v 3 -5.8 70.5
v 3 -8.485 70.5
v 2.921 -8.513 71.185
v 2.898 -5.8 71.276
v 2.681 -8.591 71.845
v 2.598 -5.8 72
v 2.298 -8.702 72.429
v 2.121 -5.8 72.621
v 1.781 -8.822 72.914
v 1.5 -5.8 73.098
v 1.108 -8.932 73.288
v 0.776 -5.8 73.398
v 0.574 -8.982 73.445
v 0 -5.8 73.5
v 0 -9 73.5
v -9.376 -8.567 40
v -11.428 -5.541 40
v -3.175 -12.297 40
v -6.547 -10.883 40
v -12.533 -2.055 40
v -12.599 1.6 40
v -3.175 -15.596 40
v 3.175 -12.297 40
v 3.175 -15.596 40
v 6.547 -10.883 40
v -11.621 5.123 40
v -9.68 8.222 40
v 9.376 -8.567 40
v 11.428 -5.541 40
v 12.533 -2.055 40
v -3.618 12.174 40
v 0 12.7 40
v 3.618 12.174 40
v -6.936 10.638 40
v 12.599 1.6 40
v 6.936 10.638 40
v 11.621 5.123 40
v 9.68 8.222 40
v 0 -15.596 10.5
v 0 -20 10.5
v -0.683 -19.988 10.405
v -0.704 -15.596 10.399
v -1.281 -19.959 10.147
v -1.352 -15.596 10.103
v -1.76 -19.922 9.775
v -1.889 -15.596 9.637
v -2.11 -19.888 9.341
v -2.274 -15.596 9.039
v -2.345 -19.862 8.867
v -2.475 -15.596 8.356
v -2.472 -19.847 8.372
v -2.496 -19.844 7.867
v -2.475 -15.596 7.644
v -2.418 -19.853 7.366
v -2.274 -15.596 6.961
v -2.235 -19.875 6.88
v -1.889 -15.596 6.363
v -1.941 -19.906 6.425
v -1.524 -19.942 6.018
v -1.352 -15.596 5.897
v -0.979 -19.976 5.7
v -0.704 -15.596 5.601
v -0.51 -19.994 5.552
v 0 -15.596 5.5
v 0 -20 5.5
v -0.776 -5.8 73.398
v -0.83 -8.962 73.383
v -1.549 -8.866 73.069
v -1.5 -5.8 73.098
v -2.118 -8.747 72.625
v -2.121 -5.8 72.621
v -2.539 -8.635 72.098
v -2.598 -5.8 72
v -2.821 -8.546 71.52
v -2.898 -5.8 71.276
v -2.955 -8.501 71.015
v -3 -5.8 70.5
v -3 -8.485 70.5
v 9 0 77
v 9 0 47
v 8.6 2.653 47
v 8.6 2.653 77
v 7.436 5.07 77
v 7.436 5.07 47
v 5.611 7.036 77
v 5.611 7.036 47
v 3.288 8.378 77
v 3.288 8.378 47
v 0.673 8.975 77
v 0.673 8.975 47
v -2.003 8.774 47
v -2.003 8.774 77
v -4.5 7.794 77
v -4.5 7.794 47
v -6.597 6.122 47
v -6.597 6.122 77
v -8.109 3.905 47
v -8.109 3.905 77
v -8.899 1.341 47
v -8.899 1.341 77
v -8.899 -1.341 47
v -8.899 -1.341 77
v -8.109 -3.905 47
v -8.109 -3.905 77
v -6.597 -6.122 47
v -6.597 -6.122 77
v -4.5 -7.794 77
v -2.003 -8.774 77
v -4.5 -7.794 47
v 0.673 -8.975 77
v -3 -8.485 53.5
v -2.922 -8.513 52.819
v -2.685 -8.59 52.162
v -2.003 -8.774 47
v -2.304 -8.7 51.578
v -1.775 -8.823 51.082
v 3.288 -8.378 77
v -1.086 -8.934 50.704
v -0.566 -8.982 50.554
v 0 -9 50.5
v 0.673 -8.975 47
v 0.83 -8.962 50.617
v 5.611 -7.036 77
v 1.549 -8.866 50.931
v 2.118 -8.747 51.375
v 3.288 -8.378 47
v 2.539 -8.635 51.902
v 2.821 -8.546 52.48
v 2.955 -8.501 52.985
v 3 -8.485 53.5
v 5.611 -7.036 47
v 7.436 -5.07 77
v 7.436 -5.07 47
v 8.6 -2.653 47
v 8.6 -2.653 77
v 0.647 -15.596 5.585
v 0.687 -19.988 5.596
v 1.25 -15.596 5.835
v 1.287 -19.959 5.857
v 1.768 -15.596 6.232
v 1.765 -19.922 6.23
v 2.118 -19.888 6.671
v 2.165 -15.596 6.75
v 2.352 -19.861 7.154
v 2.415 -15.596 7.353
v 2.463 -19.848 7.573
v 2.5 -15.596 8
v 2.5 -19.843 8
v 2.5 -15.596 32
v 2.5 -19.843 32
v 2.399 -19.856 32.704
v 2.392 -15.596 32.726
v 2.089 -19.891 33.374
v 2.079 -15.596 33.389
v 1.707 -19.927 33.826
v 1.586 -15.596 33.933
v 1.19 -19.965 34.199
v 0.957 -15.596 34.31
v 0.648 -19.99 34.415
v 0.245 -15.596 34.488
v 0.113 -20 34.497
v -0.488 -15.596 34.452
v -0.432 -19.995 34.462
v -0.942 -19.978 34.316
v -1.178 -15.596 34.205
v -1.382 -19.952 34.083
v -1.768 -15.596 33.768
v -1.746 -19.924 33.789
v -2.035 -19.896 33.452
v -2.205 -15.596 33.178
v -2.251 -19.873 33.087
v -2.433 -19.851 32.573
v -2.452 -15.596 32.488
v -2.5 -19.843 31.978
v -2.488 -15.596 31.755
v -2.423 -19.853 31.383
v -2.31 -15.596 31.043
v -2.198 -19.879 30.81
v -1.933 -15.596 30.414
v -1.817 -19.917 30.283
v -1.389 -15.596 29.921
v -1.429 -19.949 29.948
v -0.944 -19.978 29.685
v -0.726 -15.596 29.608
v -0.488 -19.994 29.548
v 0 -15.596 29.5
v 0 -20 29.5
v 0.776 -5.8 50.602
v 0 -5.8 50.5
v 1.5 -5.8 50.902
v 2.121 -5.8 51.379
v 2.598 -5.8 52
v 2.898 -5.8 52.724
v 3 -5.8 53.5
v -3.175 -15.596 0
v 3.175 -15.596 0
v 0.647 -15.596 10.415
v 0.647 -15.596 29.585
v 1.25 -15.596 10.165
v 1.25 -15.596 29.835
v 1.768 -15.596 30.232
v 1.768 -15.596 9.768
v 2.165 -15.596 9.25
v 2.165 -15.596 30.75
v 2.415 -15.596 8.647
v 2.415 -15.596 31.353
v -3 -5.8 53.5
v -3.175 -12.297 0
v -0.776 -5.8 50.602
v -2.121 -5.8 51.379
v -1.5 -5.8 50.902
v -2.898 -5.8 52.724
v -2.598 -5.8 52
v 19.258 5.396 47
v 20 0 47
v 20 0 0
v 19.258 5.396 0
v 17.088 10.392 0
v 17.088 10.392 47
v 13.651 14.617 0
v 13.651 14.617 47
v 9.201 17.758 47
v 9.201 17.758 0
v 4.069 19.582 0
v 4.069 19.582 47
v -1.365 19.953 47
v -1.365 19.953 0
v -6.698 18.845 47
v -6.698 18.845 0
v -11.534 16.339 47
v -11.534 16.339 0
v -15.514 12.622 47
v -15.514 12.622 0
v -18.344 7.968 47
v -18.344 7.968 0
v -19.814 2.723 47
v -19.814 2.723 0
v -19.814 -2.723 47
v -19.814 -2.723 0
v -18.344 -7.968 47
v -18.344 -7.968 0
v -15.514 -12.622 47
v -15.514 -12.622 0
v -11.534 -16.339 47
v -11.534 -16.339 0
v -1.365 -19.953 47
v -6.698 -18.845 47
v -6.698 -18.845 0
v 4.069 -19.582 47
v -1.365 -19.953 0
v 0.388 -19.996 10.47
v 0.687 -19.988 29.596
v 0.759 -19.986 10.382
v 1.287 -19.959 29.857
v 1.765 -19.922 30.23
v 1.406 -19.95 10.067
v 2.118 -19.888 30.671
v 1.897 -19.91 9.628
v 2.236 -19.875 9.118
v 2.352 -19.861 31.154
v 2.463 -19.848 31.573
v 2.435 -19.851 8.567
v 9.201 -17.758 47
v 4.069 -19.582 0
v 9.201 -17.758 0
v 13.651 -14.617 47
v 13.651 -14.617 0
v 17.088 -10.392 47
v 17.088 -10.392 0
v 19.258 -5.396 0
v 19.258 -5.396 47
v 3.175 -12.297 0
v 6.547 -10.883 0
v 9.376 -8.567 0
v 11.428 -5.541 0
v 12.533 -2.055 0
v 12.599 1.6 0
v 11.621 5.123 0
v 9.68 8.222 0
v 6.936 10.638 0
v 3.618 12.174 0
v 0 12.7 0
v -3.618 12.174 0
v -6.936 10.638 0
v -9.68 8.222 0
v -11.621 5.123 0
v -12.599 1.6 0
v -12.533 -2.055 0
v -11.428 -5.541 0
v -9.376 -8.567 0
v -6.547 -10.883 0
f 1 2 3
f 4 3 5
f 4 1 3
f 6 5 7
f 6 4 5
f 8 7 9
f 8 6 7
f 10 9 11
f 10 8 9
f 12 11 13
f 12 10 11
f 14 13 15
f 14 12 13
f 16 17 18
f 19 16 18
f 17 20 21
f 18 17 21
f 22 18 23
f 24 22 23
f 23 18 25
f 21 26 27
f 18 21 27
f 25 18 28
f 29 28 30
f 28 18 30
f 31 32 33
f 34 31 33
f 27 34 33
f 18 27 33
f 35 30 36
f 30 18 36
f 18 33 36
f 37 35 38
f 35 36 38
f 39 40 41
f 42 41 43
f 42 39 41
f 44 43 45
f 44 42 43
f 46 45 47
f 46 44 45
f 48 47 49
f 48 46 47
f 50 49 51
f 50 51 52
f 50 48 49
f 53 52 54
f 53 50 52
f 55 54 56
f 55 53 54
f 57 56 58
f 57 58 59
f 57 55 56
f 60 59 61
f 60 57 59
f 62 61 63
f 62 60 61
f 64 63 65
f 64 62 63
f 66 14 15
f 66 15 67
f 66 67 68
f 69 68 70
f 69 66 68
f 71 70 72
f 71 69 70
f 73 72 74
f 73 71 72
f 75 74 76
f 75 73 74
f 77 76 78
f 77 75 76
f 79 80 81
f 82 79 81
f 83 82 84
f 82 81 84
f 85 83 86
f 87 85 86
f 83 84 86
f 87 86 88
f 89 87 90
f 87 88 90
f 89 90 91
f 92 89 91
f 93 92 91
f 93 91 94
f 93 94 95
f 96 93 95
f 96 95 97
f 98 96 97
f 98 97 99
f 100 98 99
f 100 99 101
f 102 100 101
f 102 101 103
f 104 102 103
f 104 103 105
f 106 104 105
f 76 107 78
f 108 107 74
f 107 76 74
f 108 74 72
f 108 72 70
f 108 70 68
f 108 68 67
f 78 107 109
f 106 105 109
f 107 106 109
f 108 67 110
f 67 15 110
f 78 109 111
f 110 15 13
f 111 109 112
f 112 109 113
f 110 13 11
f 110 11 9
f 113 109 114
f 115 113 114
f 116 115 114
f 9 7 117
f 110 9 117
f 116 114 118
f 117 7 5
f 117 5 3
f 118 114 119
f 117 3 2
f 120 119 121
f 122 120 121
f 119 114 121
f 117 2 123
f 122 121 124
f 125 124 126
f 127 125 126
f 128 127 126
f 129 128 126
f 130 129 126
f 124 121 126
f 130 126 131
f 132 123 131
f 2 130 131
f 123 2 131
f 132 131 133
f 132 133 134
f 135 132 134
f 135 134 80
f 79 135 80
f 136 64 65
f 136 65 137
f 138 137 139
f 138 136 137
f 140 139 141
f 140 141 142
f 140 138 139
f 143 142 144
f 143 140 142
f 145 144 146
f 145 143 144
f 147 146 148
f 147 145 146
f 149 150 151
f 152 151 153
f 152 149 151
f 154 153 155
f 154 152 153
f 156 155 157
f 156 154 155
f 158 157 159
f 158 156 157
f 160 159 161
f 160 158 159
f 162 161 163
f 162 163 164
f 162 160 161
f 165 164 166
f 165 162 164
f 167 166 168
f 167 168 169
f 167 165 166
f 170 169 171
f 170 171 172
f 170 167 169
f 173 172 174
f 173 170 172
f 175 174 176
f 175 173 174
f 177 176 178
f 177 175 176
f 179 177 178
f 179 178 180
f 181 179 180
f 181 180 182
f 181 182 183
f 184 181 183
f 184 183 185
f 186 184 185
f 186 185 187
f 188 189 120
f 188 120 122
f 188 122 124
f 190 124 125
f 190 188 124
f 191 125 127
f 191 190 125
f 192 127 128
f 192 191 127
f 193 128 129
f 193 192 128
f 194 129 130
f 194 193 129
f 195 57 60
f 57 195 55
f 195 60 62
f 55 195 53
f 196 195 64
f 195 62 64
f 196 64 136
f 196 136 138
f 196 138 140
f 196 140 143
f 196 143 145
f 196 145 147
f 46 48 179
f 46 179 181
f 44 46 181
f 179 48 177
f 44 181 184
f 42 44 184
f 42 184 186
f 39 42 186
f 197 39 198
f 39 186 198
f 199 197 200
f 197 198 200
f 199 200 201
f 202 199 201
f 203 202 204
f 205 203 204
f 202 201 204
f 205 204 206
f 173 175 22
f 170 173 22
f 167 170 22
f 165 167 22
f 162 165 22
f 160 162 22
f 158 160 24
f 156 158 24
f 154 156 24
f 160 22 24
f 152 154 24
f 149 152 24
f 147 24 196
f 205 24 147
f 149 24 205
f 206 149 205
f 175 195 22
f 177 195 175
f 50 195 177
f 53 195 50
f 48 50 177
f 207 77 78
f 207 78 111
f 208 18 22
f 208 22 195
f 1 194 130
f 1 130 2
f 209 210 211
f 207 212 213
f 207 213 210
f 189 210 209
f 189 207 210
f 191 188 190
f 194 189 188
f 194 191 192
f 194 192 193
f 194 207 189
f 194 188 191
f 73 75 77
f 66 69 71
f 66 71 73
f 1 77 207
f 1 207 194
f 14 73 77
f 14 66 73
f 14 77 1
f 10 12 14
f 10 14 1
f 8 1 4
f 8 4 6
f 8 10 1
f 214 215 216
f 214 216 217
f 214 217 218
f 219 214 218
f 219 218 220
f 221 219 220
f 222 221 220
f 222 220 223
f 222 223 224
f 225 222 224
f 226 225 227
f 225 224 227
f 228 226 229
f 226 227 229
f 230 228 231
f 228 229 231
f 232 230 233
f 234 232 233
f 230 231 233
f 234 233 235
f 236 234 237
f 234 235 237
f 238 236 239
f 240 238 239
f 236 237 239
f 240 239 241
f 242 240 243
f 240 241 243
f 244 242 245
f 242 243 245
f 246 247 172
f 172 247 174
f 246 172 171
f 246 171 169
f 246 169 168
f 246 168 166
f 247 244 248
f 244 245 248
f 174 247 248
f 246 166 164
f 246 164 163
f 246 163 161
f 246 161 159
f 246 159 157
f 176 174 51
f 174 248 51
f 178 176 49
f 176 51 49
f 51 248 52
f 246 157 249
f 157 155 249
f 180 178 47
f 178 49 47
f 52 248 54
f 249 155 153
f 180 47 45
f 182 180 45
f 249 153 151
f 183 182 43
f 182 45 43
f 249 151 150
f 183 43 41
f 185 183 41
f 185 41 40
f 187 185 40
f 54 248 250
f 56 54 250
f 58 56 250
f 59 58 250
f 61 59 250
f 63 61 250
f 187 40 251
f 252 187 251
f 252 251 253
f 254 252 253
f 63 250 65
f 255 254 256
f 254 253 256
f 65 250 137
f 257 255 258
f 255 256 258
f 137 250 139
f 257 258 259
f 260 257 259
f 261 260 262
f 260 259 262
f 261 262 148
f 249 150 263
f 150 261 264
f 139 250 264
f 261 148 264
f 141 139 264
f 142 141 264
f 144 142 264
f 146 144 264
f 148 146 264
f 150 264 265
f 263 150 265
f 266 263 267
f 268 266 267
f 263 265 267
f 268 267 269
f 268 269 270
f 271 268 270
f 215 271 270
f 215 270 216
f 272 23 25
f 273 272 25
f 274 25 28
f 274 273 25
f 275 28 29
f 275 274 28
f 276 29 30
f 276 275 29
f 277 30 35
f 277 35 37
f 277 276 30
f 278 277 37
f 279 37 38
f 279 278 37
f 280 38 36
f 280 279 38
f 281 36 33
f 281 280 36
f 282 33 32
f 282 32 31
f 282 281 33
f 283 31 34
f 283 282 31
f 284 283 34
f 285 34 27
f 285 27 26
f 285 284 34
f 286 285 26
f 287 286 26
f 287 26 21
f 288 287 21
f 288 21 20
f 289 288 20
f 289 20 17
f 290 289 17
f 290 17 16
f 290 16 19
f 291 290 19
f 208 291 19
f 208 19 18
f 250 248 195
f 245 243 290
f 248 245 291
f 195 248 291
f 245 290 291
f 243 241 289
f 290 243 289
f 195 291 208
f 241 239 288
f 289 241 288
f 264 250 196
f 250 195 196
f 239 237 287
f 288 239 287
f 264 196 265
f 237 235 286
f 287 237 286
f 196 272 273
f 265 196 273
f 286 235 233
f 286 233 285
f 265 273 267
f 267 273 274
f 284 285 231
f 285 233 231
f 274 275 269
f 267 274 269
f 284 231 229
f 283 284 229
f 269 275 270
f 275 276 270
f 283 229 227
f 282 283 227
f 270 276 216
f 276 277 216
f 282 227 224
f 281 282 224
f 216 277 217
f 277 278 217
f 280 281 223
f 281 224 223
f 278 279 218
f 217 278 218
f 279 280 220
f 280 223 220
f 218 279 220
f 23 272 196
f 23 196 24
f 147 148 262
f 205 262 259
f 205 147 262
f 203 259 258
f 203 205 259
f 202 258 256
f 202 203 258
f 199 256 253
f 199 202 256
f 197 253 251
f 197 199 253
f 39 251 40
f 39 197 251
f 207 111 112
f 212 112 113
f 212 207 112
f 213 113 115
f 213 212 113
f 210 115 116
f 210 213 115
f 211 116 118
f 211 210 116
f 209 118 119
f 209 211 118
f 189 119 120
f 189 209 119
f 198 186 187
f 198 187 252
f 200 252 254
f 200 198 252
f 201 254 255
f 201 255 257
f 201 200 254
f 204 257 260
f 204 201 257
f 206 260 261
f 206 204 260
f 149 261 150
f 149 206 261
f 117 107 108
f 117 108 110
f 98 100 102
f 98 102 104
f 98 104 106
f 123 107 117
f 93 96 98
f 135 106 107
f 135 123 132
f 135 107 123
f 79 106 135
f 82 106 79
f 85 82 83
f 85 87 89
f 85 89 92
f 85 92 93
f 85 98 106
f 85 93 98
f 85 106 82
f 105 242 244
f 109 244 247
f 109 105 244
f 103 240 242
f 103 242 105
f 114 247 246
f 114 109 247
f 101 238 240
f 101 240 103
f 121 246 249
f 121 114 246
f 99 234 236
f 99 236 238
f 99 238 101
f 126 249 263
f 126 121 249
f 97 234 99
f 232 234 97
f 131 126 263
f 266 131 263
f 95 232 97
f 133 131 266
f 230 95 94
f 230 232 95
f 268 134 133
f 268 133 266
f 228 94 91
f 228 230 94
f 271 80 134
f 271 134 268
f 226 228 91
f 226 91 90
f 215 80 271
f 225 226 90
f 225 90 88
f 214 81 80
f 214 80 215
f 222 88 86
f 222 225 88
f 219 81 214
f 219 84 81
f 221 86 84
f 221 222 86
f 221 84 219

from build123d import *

# Parameters (mm, degrees)
F0_R          = 20
F0_R_2        = 12.7
F0_R_3        = 9
F1_DEPTH      = 47
F2_DEPTH      = 77
F3_DEPTH      = 40
F5_DEPTH      = 15.5956
F7_START      = 5.8
F7_DEPTH      = 3.2
F9_DEPTH      = 0.8
F9_DEPTH_BACK = 25


with BuildPart() as f1:
    # F0 (on Top) → F1 (new body)
    with BuildSketch(Plane.XY):
        Circle(F0_R)
        Circle(F0_R_2, mode=Mode.SUBTRACT)
        Circle(F0_R_2)
        Circle(F0_R_3, mode=Mode.SUBTRACT)
    extrude(amount=F1_DEPTH)

    # F0 (on Top) → F2 (join)
    with BuildSketch(Plane.XY):
        Circle(F0_R_3)
    extrude(amount=F2_DEPTH)

    # F0 (on Top) → F3 (cut)
    with BuildSketch(Plane.XY):
        Circle(F0_R_2)
        Circle(F0_R_3, mode=Mode.SUBTRACT)
        Circle(F0_R_3)
    extrude(amount=F3_DEPTH, mode=Mode.SUBTRACT)

    # F4 (on Front) → F5 (cut)
    with BuildSketch(Plane.XZ):
        Polygon((-3.175, 0), (0, 0), (3.175, 0), (3.175, 40), (-3.175, 40), align=None)
    extrude(amount=F5_DEPTH, mode=Mode.SUBTRACT)

    # F6 (on Front) → F7 (cut)
    with BuildSketch(Plane.XZ.offset(F7_START)):
        with BuildLine():
            Line((3, 53.5), (3, 70.5))
            ThreePointArc((3, 70.5), (0, 67.5), (-3, 70.5))
            Line((-3, 70.5), (-3, 53.5))
            ThreePointArc((-3, 53.5), (0, 56.5), (3, 53.5))
        make_face()
        with BuildLine():
            ThreePointArc((0, 50.5), (2.1213203436, 51.3786796564), (3, 53.5))
            ThreePointArc((3, 53.5), (0, 56.5), (-3, 53.5))
            ThreePointArc((-3, 53.5), (-2.1213203436, 51.3786796564), (0, 50.5))
        make_face()
        with BuildLine():
            ThreePointArc((3, 70.5), (2.1213203436, 72.6213203436), (0, 73.5))
            ThreePointArc((0, 73.5), (-2.1213203436, 72.6213203436), (-3, 70.5))
            ThreePointArc((-3, 70.5), (0, 67.5), (3, 70.5))
        make_face()
    extrude(amount=F7_DEPTH, mode=Mode.SUBTRACT)

    # F8 (on Front) → F9 (cut, two sides)
    with BuildSketch(Plane.XZ) as f9_sk:
        with BuildLine():
            ThreePointArc((0, 5.5), (1.767766953, 6.232233047), (2.5, 8))
            ThreePointArc((2.5, 8), (1.767766953, 9.767766953), (0, 10.5))
            Line((0, 10.5), (0, 8))
            Line((0, 8), (0, 5.5))
        make_face()
        with BuildLine():
            ThreePointArc((2.5, 32), (-1.767766953, 33.767766953), (0, 29.5))
            ThreePointArc((0, 29.5), (1.767766953, 30.232233047), (2.5, 32))
        make_face()
        with BuildLine():
            Line((0, 8), (0, 10.5))
            ThreePointArc((0, 10.5), (-2.5, 8), (0, 5.5))
            Line((0, 5.5), (0, 8))
        make_face()
    extrude(amount=-F9_DEPTH, mode=Mode.SUBTRACT)
    extrude(f9_sk.sketch, amount=F9_DEPTH_BACK, mode=Mode.SUBTRACT)


solid = f1.part
